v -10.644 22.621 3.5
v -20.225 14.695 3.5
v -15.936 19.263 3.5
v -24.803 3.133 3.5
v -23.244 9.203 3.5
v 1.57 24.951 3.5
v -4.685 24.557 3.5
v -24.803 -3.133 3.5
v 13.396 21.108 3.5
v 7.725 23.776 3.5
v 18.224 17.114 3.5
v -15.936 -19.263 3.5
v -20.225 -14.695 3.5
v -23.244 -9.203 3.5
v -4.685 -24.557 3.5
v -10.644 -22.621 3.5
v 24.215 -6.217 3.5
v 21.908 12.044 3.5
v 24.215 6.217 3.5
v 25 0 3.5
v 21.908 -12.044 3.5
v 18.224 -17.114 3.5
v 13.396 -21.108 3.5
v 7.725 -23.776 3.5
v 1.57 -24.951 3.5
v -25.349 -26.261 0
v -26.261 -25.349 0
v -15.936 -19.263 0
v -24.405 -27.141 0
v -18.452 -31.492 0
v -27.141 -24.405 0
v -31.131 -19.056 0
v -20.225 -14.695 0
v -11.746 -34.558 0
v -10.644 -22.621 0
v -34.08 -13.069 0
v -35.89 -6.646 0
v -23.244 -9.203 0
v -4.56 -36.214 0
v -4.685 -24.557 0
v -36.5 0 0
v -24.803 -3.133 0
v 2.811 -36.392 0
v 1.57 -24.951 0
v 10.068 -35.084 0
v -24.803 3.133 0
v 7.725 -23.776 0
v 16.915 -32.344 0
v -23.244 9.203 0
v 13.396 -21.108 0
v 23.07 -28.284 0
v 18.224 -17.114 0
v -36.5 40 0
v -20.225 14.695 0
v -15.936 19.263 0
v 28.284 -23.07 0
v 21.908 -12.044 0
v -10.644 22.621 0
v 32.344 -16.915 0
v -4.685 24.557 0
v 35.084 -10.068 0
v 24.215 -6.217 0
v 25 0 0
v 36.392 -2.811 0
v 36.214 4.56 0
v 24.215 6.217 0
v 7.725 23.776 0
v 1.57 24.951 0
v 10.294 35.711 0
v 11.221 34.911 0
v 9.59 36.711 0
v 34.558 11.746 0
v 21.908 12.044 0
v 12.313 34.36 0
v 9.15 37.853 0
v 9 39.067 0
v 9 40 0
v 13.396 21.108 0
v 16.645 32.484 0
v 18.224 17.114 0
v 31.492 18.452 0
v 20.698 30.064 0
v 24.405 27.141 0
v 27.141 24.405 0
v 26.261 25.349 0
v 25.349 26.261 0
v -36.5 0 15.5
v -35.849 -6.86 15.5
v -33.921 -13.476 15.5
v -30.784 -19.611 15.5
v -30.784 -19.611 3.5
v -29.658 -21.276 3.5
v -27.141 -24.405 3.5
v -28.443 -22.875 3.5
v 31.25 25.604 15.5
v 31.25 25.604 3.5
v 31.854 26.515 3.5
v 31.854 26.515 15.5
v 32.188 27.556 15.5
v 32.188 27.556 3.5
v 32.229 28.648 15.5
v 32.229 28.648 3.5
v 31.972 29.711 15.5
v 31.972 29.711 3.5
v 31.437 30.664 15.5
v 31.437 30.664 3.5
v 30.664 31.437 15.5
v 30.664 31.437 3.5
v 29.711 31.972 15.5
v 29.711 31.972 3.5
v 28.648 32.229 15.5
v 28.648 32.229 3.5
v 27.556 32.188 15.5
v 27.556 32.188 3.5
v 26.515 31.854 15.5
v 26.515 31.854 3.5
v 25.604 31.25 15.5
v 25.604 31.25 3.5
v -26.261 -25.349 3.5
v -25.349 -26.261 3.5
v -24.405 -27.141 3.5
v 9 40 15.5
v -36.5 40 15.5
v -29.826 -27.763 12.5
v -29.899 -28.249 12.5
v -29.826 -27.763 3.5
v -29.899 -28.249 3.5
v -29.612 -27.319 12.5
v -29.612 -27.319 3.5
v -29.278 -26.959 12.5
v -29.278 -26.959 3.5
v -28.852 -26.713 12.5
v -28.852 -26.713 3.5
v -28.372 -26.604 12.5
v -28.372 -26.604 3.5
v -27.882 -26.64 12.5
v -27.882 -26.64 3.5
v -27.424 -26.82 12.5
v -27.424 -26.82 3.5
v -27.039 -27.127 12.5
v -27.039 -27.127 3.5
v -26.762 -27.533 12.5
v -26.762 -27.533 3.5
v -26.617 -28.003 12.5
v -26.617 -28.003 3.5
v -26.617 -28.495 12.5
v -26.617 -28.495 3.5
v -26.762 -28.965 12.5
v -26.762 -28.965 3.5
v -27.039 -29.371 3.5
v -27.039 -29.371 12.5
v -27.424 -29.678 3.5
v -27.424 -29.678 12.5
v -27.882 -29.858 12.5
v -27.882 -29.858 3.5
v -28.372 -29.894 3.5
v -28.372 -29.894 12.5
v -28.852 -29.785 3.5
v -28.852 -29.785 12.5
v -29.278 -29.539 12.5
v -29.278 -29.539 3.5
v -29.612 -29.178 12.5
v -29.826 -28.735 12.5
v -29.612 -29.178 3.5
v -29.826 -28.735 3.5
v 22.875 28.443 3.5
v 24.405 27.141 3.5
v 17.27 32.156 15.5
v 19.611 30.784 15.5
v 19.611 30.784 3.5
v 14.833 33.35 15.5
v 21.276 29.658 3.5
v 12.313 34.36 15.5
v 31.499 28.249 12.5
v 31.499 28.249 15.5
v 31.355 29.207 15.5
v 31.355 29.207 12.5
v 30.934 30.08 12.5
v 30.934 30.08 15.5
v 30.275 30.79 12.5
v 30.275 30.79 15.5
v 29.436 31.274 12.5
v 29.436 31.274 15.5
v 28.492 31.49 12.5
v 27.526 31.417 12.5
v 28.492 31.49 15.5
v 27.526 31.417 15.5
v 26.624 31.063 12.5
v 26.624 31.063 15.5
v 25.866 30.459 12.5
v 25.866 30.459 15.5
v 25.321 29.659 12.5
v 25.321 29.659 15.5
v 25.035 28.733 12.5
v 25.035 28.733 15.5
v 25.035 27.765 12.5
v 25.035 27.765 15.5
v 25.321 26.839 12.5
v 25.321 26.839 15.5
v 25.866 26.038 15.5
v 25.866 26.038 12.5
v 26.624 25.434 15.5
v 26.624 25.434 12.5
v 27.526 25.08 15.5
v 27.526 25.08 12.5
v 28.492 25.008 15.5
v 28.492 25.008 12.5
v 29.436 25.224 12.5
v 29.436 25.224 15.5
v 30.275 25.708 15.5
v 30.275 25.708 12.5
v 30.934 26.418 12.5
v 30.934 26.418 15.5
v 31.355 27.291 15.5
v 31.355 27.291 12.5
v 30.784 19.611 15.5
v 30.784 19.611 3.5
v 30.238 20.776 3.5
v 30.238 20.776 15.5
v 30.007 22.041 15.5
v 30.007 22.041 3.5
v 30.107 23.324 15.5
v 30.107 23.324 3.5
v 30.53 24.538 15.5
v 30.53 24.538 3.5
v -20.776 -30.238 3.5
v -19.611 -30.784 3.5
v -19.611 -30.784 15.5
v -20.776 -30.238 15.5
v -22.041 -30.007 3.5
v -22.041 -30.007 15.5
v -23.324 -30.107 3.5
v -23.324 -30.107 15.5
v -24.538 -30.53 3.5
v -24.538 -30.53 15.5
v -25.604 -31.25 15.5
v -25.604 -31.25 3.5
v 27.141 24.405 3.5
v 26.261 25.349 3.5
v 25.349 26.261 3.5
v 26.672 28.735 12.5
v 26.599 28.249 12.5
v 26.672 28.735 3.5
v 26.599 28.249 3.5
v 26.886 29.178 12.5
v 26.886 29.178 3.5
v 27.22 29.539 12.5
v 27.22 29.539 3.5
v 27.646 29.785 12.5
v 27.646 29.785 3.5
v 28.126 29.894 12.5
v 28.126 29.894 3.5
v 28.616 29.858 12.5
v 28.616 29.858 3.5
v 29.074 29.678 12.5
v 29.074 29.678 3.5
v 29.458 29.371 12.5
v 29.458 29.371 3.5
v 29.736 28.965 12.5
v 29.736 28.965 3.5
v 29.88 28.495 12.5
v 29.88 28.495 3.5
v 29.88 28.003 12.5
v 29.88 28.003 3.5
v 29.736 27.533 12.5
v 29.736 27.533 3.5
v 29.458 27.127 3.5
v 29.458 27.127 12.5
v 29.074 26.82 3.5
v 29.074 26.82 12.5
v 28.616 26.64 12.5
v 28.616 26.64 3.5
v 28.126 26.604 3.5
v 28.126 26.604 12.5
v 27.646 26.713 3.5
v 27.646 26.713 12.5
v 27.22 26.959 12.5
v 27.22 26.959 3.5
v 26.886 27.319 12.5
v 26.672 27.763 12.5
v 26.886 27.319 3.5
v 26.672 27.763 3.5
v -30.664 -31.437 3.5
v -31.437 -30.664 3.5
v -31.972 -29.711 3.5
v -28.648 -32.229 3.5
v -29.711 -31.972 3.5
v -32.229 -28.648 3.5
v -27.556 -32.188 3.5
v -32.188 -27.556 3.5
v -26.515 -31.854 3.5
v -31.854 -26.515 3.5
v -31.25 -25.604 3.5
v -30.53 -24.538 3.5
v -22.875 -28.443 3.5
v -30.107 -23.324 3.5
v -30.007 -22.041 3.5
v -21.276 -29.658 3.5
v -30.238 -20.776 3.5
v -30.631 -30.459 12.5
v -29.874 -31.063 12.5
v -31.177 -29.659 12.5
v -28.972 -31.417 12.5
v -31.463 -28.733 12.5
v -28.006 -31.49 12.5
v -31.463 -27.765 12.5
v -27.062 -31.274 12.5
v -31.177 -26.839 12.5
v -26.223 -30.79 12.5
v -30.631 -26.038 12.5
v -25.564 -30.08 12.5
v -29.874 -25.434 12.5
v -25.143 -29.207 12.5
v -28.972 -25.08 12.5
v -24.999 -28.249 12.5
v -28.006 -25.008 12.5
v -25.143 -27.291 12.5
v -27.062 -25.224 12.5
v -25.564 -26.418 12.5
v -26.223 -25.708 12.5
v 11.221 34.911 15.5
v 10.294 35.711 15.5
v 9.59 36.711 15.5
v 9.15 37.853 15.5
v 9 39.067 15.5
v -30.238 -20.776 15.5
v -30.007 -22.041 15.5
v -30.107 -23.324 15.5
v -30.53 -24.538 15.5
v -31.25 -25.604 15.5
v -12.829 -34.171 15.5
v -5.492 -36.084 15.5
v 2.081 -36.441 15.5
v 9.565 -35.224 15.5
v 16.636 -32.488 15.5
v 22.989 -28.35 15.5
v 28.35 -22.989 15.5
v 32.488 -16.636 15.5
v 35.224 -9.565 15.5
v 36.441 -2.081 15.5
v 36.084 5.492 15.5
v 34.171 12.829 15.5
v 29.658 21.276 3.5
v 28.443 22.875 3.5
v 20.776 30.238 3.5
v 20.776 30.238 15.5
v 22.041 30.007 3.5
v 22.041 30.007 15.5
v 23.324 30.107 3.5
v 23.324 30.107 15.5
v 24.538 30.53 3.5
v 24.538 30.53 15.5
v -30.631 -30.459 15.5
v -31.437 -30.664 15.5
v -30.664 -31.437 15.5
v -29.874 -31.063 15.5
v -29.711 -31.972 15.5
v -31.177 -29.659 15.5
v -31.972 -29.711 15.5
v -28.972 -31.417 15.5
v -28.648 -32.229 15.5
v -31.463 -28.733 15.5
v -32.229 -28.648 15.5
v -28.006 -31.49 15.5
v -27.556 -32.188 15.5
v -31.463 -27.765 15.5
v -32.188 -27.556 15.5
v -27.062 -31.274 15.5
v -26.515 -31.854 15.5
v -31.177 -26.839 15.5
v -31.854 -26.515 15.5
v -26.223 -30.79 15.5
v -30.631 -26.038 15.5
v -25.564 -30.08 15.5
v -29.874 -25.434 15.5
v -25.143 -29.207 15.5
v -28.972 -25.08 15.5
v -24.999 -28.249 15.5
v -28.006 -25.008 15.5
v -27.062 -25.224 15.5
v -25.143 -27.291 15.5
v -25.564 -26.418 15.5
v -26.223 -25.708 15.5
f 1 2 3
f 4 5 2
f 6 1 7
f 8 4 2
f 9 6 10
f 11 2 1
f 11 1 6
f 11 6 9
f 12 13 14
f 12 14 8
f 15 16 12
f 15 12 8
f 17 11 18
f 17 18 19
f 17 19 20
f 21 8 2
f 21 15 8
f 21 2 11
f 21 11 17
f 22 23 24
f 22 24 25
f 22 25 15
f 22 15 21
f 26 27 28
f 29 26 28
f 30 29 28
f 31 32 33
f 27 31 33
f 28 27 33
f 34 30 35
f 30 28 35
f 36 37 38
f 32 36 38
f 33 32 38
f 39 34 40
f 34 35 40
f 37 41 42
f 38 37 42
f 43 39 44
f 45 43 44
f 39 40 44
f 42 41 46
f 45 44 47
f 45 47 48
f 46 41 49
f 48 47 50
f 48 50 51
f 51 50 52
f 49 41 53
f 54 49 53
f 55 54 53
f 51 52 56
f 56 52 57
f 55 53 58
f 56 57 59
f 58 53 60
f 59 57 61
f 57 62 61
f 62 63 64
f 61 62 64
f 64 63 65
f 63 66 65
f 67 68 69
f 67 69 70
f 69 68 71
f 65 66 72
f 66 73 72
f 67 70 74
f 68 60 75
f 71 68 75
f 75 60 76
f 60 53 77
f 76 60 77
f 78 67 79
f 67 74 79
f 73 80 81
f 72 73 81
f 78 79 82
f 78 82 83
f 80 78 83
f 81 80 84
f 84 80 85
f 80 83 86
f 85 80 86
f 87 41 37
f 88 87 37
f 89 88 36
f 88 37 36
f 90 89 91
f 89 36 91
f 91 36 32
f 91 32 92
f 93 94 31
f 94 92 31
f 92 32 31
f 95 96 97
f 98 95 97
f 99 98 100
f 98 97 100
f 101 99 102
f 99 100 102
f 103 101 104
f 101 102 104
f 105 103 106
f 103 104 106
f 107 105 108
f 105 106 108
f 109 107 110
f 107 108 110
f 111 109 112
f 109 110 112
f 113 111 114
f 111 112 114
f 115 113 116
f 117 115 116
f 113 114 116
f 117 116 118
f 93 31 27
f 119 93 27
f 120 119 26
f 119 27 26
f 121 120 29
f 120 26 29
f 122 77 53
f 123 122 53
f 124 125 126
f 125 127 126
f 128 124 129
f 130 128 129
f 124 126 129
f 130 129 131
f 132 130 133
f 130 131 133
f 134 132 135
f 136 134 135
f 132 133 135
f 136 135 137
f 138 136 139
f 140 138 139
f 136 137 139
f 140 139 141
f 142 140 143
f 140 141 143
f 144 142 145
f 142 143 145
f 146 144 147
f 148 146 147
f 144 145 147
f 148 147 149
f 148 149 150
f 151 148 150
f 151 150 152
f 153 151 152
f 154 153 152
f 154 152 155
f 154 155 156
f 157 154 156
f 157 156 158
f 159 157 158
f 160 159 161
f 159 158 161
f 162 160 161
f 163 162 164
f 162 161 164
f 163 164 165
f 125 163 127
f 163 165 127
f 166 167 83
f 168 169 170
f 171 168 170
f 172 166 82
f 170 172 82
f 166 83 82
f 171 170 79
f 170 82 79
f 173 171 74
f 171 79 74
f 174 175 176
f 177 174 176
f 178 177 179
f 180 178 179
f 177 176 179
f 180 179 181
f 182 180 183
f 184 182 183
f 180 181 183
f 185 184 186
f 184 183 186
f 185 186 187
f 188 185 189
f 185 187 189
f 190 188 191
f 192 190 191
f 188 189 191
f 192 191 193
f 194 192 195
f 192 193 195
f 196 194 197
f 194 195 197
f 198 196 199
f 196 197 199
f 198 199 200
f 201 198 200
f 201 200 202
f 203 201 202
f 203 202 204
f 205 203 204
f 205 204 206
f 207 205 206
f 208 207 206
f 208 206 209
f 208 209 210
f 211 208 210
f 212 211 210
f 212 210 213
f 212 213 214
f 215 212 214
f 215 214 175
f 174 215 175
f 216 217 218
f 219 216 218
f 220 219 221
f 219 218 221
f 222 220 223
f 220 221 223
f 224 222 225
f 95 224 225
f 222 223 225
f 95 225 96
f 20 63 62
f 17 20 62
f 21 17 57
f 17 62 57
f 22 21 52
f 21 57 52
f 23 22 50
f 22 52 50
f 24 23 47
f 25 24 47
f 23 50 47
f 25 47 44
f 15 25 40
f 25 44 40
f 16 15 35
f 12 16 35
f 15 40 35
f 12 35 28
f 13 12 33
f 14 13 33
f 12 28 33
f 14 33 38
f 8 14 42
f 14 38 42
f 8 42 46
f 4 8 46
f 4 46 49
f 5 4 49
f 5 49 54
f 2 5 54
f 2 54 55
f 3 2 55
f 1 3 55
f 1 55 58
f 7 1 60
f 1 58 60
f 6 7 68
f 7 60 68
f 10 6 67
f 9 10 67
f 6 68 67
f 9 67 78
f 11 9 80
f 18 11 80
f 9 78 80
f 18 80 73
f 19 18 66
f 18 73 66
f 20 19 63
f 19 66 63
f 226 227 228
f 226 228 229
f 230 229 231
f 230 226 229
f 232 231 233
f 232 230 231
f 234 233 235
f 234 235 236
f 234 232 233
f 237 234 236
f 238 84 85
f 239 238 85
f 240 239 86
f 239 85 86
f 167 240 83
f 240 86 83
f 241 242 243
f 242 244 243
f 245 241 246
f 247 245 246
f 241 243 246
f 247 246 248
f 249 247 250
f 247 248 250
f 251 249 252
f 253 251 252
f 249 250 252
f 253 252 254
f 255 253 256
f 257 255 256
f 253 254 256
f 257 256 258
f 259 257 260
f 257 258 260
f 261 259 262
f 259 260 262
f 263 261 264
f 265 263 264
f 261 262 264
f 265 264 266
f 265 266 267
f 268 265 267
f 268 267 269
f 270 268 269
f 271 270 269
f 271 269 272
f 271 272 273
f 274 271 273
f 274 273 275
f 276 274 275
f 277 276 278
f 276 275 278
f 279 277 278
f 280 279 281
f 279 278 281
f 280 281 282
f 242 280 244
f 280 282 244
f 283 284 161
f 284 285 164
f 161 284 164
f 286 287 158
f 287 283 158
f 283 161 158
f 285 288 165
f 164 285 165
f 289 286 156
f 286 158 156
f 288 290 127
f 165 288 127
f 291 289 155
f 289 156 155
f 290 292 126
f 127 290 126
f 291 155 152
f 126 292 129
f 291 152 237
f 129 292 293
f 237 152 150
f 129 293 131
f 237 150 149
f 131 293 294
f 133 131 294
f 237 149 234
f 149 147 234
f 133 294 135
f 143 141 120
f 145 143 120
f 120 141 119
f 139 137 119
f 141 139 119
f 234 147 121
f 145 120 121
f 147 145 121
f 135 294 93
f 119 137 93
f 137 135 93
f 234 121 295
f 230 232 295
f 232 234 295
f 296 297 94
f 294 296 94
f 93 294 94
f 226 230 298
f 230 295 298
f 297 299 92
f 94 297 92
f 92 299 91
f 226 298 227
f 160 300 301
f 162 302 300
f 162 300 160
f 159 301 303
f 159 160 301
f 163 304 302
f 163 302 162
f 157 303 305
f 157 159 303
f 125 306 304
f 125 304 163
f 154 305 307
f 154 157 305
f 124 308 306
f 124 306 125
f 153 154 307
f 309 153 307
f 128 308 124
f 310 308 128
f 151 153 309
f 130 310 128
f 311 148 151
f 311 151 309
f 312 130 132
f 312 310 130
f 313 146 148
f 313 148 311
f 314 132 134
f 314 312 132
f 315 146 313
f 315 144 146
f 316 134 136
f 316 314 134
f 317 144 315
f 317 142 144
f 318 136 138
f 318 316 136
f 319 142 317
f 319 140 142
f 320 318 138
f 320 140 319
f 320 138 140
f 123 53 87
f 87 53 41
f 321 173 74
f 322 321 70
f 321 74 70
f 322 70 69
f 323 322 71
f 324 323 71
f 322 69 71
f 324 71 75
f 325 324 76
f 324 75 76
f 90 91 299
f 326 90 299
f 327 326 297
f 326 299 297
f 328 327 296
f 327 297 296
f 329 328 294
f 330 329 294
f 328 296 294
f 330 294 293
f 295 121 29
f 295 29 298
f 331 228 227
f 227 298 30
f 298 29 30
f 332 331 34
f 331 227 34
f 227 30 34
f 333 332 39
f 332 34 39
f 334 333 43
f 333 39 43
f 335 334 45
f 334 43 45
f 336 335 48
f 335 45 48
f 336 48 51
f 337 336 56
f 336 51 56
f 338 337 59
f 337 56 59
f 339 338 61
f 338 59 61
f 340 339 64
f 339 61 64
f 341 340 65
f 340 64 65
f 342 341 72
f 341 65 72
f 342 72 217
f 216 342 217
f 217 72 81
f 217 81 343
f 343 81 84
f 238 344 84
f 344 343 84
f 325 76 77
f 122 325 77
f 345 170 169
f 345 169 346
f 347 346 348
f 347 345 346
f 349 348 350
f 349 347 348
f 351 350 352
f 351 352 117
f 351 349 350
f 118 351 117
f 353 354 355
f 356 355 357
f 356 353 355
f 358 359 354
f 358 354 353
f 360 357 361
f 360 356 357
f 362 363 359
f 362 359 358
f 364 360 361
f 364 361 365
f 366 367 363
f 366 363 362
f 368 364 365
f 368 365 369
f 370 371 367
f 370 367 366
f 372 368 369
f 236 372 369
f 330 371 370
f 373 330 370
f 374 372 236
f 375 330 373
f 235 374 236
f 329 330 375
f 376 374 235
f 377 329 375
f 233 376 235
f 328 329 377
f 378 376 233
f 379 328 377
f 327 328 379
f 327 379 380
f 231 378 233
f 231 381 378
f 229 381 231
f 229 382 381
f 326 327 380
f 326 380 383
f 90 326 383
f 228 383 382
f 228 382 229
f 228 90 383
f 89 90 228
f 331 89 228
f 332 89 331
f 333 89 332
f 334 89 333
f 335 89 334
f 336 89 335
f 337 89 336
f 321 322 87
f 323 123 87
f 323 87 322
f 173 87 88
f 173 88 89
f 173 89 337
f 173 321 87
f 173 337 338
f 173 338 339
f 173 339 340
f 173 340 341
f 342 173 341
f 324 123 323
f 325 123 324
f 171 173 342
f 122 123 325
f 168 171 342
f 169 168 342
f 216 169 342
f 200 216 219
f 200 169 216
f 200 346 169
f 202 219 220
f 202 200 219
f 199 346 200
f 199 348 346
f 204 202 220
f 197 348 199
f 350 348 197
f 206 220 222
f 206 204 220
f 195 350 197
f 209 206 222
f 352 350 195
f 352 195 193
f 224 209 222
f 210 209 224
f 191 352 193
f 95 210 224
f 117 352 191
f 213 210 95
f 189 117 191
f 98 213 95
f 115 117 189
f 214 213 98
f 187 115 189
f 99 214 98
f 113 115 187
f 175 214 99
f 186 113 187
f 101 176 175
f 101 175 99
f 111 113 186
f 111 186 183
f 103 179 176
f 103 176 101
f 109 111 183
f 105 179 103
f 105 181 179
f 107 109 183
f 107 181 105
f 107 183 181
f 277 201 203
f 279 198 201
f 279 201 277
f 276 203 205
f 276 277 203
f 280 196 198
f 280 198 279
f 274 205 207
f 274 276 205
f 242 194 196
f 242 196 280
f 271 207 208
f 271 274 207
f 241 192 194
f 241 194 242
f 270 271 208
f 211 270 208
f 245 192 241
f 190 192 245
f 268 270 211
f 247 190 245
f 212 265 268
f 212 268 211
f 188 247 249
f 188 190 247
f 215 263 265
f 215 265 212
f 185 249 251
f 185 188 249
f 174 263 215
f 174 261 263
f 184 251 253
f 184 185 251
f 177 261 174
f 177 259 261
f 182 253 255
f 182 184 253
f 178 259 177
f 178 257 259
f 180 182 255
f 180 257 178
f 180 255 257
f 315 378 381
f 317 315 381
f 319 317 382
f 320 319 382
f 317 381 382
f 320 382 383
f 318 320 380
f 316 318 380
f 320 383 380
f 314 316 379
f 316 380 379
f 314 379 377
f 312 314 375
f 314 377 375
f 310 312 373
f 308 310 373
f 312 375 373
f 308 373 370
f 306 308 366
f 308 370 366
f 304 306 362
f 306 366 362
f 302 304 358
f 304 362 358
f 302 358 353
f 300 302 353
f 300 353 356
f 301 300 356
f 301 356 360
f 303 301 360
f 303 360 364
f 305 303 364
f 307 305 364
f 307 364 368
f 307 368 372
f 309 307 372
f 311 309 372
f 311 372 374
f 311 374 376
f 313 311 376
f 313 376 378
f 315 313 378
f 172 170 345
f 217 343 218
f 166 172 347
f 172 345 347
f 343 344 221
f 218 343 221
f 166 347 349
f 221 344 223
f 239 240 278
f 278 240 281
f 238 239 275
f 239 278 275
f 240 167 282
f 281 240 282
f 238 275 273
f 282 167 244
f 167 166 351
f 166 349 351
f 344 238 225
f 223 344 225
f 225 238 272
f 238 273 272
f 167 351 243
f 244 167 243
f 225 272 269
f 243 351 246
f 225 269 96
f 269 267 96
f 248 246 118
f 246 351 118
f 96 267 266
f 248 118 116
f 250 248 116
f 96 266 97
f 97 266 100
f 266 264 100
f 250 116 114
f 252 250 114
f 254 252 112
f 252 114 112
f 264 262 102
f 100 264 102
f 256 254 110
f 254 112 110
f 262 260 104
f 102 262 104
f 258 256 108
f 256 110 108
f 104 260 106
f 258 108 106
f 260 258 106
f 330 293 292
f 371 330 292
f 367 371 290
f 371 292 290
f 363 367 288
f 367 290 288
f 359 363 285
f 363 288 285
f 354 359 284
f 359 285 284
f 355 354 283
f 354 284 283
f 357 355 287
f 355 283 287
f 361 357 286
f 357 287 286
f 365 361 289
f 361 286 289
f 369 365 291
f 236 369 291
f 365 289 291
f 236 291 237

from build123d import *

# Parameters (mm, degrees)
F1_DEPTH       = 15.5
F2_R           = 25
F3_DEPTH       = 3.5
F5_D           = 3.3
F5_CBORE_D     = 6.5
F5_CBORE_DEPTH = 3
F6_T1_DEPTH    = 12
F6_T3_DEPTH    = 15.5


# Not quite as in the source:
# - a fillet or chamfer that OpenCascade refuses, or shapes differently, is made with other operations: its cross-section is extruded or revolved along the edge and cut away or added


with BuildPart() as f1:
    # F0 (on Top) → F1 (new body)
    with BuildSketch(Plane.XY):
        with BuildLine():
            ThreePointArc((27.1408006584, 24.4054694612), (31.0773430331, 31.0773430331), (24.4054694612, 27.1408006584))
            ThreePointArc((24.4054694612, 27.1408006584), (17.2024322308, 32.1920226973), (9, 35.3730123116))
            Line((9, 35.3730123116), (9, 40))
            Line((9, 40), (-36.5, 40))
            Line((-36.5, 40), (-36.5, 0))
            ThreePointArc((-36.5, 0), (-34.0799737678, -13.0692535358), (-27.1408006584, -24.4054694612))
            ThreePointArc((-27.1408006584, -24.4054694612), (-31.0773430331, -31.0773430331), (-24.4054694612, -27.1408006584))
            ThreePointArc((-24.4054694612, -27.1408006584), (25.8093975133, -25.8093975133), (27.1408006584, 24.4054694612))
        make_face()
    extrude(amount=F1_DEPTH)

    # F2 (on face) → F3 (cut)
    with BuildSketch(Plane(origin=(0, 0, 0), x_dir=(1, 0, 0), z_dir=(0, 0, -1))):
        with BuildLine():
            ThreePointArc((-27.1408006584, 24.4054694612), (-25.8093975133, 25.8093975133), (-24.4054694612, 27.1408006584))
            ThreePointArc((-24.4054694612, 27.1408006584), (-31.0773430331, 31.0773430331), (-27.1408006584, 24.4054694612))
        make_face()
        with BuildLine():
            ThreePointArc((27.1408006584, -24.4054694612), (25.8093975133, -25.8093975133), (24.4054694612, -27.1408006584))
            ThreePointArc((24.4054694612, -27.1408006584), (31.0773430331, -31.0773430331), (27.1408006584, -24.4054694612))
        make_face()
        Circle(F2_R)
    extrude(amount=-F3_DEPTH, mode=Mode.SUBTRACT)

    # F5 (through all)
    with Locations(Plane.XY.offset(15.5)):
        with Locations((-28.2489159084, -28.2489159084), (28.2489159084, 28.2489159084)):
            CounterBoreHole(F5_D / 2, F5_CBORE_D / 2, F5_CBORE_DEPTH)

    # F6: fillet of radius 5 on 5 edges, made by hand

    # F6_s2 → F6_t1 (join)
    with BuildSketch(Plane.XY.offset(3.5)):
        with BuildLine():
            ThreePointArc((-30.783749931, -19.6114951033), (-30.0157488678, -22.6856125629), (-31.2497097164, -25.6040649633))
            ThreePointArc((-31.2497097164, -25.6040649633), (-29.369056893, -24.4089570317), (-27.1408006584, -24.4054694612))
            ThreePointArc((-27.1408006584, -24.4054694612), (-29.0612962165, -22.0837284492), (-30.783749931, -19.6114951033))
        make_face()
        with BuildLine():
            ThreePointArc((-19.6114951033, -30.783749931), (-22.6856125629, -30.0157488678), (-25.6040649633, -31.2497097164))
            ThreePointArc((-25.6040649633, -31.2497097164), (-24.4089570317, -29.369056893), (-24.4054694612, -27.1408006584))
            ThreePointArc((-24.4054694612, -27.1408006584), (-22.0837284492, -29.0612962165), (-19.6114951033, -30.783749931))
        make_face()
        with BuildLine():
            ThreePointArc((30.783749931, 19.6114951033), (30.0157488678, 22.6856125629), (31.2497097164, 25.6040649633))
            ThreePointArc((31.2497097164, 25.6040649633), (29.369056893, 24.4089570317), (27.1408006584, 24.4054694612))
            ThreePointArc((27.1408006584, 24.4054694612), (29.0612962165, 22.0837284492), (30.783749931, 19.6114951033))
        make_face()
        with BuildLine():
            ThreePointArc((19.6114951033, 30.783749931), (22.6856125629, 30.0157488678), (25.6040649633, 31.2497097164))
            ThreePointArc((25.6040649633, 31.2497097164), (24.4089570317, 29.369056893), (24.4054694612, 27.1408006584))
            ThreePointArc((24.4054694612, 27.1408006584), (22.0837284492, 29.0612962165), (19.6114951033, 30.783749931))
        make_face()
    extrude(amount=F6_T1_DEPTH)

    # F6_s4 → F6_t3 (join)
    with BuildSketch(Plane.XY):
        with BuildLine():
            ThreePointArc((12.313253012, 34.3603521557), (9.9113734005, 36.189206534), (9, 39.0672497112))
            Line((9, 39.0672497112), (9, 35.3730123116))
            ThreePointArc((9, 35.3730123116), (10.6686483978, 34.9060158334), (12.313253012, 34.3603521557))
        make_face()
    extrude(amount=F6_T3_DEPTH)


solid = f1.part
